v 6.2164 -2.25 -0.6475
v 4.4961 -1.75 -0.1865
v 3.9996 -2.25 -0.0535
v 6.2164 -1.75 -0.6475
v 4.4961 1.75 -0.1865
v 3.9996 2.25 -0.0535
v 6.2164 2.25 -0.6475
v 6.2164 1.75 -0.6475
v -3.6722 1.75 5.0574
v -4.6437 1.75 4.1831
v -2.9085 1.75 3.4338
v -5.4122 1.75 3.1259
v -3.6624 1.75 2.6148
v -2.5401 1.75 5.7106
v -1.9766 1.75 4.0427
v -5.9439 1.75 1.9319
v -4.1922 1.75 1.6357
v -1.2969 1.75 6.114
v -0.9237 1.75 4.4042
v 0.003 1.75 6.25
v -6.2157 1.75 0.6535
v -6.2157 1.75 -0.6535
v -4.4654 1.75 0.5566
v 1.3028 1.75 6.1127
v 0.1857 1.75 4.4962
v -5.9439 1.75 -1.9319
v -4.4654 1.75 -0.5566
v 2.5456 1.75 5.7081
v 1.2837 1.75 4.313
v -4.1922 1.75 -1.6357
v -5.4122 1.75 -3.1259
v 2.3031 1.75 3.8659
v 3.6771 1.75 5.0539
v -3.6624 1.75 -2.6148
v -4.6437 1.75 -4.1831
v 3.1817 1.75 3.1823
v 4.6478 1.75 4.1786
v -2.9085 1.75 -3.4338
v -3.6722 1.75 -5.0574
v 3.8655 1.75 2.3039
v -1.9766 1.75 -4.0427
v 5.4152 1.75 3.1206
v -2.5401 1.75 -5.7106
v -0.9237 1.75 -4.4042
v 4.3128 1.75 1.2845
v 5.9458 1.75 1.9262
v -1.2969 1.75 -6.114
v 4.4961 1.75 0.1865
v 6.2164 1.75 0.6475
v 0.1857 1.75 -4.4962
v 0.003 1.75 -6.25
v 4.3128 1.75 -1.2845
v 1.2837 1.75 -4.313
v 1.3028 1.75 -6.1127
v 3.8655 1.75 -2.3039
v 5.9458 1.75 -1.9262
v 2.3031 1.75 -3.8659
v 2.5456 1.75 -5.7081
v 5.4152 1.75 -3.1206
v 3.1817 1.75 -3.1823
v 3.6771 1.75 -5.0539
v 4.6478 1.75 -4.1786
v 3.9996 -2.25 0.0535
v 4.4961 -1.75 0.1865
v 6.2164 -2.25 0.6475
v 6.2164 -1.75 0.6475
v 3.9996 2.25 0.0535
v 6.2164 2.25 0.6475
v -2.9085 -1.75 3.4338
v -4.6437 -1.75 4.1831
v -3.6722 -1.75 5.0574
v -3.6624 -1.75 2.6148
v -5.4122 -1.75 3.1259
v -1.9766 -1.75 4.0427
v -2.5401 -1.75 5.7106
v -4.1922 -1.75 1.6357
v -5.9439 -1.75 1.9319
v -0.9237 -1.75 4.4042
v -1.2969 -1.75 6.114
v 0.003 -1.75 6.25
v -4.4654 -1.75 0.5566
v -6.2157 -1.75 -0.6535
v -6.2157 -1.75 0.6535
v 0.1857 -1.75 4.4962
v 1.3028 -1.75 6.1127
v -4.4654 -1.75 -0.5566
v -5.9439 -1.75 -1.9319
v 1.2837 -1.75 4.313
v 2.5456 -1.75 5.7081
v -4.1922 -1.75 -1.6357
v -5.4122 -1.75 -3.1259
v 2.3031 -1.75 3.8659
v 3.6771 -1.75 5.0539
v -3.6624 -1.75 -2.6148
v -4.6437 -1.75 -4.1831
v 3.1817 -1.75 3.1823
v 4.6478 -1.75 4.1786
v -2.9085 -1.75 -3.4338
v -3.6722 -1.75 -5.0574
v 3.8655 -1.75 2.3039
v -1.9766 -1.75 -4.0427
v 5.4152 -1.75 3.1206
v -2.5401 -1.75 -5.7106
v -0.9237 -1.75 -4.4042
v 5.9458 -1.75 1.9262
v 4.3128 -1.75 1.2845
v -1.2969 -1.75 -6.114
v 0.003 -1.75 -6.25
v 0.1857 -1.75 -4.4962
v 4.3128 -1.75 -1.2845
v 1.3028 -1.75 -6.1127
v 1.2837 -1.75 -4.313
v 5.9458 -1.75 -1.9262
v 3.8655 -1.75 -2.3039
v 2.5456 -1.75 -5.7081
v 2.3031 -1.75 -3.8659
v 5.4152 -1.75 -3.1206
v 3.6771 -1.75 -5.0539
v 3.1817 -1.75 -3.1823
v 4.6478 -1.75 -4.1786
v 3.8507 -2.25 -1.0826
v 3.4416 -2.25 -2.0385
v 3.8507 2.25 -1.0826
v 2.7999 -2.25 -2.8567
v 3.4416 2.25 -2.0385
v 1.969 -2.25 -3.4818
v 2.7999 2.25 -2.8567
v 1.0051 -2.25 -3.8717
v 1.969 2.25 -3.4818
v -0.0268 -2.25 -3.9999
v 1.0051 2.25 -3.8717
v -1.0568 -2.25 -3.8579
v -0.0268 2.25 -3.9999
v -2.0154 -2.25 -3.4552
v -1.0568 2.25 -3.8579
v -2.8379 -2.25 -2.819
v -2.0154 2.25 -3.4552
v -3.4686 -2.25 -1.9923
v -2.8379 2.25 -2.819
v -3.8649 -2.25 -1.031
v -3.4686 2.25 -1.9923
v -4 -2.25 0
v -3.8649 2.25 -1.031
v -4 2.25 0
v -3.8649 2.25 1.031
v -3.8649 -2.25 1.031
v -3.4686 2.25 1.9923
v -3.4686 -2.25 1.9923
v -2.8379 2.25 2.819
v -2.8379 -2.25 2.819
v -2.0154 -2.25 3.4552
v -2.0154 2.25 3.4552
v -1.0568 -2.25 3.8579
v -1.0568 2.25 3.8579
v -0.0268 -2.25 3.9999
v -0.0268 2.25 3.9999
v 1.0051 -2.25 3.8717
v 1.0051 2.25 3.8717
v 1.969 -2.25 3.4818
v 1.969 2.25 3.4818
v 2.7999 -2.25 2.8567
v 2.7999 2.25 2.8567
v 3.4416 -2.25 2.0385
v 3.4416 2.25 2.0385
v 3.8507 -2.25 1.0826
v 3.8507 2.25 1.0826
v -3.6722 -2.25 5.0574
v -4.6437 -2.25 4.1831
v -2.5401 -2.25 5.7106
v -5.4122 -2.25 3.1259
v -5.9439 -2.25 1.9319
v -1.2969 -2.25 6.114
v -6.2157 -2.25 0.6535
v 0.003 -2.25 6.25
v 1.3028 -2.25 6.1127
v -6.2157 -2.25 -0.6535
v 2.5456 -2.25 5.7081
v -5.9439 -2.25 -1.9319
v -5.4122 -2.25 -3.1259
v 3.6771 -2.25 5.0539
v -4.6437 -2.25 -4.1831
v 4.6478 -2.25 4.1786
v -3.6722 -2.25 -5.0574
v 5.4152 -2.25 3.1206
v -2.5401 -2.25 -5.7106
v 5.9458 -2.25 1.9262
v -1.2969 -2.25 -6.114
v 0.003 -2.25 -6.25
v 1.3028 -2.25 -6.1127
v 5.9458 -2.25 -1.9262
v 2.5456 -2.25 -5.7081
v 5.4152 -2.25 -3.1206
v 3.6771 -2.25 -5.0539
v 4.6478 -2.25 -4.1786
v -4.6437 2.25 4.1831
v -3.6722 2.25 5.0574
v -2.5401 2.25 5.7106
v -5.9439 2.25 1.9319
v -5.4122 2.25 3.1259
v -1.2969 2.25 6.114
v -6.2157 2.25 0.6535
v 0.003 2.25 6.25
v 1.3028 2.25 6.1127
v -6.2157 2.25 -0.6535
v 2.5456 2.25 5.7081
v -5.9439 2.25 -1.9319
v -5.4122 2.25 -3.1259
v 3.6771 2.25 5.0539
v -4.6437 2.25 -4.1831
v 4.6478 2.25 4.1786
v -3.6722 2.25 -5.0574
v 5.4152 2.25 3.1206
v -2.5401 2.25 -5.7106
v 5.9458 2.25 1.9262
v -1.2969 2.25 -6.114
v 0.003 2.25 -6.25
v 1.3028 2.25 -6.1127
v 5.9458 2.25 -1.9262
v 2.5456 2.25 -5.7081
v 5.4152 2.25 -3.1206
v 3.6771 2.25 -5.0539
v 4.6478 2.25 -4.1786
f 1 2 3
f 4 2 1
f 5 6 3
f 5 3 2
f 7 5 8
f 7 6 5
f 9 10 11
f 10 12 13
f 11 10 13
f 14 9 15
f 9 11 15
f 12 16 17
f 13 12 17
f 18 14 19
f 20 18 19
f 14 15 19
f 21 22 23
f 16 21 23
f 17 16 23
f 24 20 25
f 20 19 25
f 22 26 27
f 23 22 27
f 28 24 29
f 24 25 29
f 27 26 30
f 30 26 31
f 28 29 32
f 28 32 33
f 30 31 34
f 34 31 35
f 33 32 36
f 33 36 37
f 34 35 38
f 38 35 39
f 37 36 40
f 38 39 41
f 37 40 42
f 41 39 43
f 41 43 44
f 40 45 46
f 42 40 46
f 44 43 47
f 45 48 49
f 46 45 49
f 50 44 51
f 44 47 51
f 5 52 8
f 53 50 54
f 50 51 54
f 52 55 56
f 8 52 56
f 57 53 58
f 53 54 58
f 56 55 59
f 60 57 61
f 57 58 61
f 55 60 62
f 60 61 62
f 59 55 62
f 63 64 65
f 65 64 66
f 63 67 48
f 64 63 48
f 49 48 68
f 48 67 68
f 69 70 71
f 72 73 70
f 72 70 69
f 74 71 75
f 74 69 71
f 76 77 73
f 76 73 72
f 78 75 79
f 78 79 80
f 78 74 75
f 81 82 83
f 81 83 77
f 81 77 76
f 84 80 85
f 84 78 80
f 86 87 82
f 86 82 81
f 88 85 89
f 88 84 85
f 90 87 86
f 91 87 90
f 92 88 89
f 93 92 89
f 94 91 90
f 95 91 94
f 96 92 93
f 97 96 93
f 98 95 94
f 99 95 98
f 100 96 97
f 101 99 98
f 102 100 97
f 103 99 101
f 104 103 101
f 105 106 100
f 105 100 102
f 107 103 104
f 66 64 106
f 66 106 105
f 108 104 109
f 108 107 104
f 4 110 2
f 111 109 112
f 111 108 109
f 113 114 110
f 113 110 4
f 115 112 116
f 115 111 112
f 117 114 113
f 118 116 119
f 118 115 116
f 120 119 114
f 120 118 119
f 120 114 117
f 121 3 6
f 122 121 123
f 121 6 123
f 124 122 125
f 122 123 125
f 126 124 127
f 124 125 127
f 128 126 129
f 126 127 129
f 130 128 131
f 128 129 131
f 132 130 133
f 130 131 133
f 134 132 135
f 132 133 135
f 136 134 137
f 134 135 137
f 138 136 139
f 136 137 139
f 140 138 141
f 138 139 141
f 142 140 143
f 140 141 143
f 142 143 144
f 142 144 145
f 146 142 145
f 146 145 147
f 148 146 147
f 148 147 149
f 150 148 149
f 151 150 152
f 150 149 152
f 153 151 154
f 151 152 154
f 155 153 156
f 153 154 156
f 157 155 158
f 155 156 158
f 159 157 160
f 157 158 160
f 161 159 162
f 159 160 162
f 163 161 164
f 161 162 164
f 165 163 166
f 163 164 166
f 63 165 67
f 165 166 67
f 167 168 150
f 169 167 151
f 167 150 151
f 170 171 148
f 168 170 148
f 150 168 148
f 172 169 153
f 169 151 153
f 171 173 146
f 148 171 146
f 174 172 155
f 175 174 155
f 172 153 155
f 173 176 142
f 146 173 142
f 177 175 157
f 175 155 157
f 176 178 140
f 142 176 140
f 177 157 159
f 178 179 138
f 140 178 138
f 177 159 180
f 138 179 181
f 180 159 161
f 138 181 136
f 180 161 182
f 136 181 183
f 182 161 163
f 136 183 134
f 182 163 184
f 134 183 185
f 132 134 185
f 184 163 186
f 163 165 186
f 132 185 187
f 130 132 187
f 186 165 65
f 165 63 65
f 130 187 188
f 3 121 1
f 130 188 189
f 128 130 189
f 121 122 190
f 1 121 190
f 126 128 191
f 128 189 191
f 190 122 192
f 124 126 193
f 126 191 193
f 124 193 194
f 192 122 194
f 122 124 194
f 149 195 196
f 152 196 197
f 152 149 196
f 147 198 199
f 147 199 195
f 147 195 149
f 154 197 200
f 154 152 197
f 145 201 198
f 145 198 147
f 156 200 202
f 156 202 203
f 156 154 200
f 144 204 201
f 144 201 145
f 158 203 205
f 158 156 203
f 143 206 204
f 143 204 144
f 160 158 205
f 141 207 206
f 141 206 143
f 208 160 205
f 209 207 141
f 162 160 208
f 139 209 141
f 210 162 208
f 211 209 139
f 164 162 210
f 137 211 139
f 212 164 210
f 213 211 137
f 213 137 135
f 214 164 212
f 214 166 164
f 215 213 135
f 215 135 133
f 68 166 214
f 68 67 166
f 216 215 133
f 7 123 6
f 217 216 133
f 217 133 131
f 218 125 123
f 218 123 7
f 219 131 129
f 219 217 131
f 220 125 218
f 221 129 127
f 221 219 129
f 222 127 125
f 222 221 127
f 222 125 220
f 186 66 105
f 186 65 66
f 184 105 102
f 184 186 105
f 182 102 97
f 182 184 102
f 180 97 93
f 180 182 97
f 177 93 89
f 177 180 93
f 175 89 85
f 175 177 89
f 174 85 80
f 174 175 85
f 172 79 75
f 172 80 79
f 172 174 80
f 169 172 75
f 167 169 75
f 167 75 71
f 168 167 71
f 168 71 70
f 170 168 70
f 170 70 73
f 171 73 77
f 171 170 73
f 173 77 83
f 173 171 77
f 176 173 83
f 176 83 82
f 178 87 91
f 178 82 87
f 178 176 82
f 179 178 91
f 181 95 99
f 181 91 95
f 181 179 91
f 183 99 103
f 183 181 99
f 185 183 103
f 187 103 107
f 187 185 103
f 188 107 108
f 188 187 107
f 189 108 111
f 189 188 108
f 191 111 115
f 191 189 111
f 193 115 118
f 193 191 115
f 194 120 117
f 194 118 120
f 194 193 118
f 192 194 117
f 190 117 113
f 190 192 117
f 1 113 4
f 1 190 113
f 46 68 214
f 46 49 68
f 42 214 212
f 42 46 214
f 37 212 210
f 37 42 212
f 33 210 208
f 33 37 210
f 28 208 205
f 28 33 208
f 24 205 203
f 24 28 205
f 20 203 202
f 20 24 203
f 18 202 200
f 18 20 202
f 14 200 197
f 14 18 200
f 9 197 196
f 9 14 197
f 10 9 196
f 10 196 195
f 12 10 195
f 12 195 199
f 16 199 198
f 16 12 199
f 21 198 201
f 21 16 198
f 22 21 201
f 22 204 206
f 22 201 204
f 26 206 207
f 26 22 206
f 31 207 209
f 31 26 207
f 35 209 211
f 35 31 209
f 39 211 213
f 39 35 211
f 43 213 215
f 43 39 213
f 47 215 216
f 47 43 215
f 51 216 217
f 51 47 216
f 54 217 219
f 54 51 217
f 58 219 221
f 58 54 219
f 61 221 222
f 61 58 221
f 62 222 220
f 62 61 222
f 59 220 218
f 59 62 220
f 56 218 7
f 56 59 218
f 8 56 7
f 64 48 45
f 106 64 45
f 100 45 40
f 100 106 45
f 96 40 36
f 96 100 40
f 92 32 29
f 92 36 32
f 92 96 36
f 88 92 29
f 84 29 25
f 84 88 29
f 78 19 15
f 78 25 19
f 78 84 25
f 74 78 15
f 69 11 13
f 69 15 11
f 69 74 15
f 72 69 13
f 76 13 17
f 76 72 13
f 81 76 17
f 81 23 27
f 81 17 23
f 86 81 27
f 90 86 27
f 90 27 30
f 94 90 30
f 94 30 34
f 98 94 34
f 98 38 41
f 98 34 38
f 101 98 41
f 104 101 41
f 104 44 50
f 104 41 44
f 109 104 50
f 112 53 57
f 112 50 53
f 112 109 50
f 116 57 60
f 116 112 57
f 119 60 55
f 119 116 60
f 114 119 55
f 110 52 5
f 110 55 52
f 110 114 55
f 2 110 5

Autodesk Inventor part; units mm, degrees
ref_plane "YZ Plane" through (0, 0, 0) normal (1, 0, 0) x (0, 1, 0)
ref_plane "XZ Plane" through (0, 0, 0) normal (0, 1, 0) x (-1, 0, 0)
ref_plane "XY Plane" through (0, 0, 0) normal (0, 0, 1) x (1, 0, 0)
sketch "Sketch1" plane through (0, 0, 0) normal (0, 0, 1) x (1, 0, 0)
  line L0 (0, -3.15) -> (0, 3.15) projected
  line L1 (-1.25, 0) -> (7.5, 0) projected
  line L2 (4, -2.25) -> (4, 2.25)
  line L3 (4, 2.25) -> (6.25, 2.25)
  line L4 (6.25, 2.25) -> (6.25, 1.75)
  line L5 (6.25, 1.75) -> (4.5, 1.75)
  line L6 (4.5, 1.75) -> (4.5, -1.75)
  line L7 (4.5, -1.75) -> (6.25, -1.75)
  line L8 (6.25, -1.75) -> (6.25, -2.25)
  line L9 (6.25, -2.25) -> (4, -2.25)
  point P0 (0, 0)
  point P1 (4.5, 0)
  dimension "d0" = 8
  dimension "d1" = 9
  dimension "d2" = 12.5
  dimension "d3" = 0.5
  dimension "d4" = 3.5
  dimension "d5" = 0.5
revolve "Revolution1" add sketch "Sketch1" angle 360 about axis through (0, -10, 0) along (0, 1, 0)
sketch "Sketch2" plane through (0, 2.25, 0) normal (0, 1, 0) x (1, 0, 0)
  circle A0 centre (0, 0) radius 6.25 projected
  circle A1 centre (0, 0) radius 4 projected
  line L0 (-8.75, 0) -> (8.75, 0) projected
  line L1 (0, 8.75) -> (0, -8.75) projected
  line L2 (3.9996, -0.0535) -> (6.2164, -0.6475)
  line L3 (3.9996, 0.0535) -> (6.2164, 0.6475)
  arc A2 (3.9996, -0.0535) -> (3.9996, 0.0535) centre (0, 0) ccw
  arc A3 (6.2164, -0.6475) -> (6.2164, 0.6475) centre (0, 0) ccw
  dimension "d8" = 15
  dimension "d9" = 30
  dimension "d10" = 2.2167
  dimension "d11" = 2.2167
extrude "Extrusion1" cut sketch "Sketch2" against normal through all contours L0 A1 L3 A0 | A0 L2 A1 L0
properties part number "314-14" material "Nylon-6/6"
